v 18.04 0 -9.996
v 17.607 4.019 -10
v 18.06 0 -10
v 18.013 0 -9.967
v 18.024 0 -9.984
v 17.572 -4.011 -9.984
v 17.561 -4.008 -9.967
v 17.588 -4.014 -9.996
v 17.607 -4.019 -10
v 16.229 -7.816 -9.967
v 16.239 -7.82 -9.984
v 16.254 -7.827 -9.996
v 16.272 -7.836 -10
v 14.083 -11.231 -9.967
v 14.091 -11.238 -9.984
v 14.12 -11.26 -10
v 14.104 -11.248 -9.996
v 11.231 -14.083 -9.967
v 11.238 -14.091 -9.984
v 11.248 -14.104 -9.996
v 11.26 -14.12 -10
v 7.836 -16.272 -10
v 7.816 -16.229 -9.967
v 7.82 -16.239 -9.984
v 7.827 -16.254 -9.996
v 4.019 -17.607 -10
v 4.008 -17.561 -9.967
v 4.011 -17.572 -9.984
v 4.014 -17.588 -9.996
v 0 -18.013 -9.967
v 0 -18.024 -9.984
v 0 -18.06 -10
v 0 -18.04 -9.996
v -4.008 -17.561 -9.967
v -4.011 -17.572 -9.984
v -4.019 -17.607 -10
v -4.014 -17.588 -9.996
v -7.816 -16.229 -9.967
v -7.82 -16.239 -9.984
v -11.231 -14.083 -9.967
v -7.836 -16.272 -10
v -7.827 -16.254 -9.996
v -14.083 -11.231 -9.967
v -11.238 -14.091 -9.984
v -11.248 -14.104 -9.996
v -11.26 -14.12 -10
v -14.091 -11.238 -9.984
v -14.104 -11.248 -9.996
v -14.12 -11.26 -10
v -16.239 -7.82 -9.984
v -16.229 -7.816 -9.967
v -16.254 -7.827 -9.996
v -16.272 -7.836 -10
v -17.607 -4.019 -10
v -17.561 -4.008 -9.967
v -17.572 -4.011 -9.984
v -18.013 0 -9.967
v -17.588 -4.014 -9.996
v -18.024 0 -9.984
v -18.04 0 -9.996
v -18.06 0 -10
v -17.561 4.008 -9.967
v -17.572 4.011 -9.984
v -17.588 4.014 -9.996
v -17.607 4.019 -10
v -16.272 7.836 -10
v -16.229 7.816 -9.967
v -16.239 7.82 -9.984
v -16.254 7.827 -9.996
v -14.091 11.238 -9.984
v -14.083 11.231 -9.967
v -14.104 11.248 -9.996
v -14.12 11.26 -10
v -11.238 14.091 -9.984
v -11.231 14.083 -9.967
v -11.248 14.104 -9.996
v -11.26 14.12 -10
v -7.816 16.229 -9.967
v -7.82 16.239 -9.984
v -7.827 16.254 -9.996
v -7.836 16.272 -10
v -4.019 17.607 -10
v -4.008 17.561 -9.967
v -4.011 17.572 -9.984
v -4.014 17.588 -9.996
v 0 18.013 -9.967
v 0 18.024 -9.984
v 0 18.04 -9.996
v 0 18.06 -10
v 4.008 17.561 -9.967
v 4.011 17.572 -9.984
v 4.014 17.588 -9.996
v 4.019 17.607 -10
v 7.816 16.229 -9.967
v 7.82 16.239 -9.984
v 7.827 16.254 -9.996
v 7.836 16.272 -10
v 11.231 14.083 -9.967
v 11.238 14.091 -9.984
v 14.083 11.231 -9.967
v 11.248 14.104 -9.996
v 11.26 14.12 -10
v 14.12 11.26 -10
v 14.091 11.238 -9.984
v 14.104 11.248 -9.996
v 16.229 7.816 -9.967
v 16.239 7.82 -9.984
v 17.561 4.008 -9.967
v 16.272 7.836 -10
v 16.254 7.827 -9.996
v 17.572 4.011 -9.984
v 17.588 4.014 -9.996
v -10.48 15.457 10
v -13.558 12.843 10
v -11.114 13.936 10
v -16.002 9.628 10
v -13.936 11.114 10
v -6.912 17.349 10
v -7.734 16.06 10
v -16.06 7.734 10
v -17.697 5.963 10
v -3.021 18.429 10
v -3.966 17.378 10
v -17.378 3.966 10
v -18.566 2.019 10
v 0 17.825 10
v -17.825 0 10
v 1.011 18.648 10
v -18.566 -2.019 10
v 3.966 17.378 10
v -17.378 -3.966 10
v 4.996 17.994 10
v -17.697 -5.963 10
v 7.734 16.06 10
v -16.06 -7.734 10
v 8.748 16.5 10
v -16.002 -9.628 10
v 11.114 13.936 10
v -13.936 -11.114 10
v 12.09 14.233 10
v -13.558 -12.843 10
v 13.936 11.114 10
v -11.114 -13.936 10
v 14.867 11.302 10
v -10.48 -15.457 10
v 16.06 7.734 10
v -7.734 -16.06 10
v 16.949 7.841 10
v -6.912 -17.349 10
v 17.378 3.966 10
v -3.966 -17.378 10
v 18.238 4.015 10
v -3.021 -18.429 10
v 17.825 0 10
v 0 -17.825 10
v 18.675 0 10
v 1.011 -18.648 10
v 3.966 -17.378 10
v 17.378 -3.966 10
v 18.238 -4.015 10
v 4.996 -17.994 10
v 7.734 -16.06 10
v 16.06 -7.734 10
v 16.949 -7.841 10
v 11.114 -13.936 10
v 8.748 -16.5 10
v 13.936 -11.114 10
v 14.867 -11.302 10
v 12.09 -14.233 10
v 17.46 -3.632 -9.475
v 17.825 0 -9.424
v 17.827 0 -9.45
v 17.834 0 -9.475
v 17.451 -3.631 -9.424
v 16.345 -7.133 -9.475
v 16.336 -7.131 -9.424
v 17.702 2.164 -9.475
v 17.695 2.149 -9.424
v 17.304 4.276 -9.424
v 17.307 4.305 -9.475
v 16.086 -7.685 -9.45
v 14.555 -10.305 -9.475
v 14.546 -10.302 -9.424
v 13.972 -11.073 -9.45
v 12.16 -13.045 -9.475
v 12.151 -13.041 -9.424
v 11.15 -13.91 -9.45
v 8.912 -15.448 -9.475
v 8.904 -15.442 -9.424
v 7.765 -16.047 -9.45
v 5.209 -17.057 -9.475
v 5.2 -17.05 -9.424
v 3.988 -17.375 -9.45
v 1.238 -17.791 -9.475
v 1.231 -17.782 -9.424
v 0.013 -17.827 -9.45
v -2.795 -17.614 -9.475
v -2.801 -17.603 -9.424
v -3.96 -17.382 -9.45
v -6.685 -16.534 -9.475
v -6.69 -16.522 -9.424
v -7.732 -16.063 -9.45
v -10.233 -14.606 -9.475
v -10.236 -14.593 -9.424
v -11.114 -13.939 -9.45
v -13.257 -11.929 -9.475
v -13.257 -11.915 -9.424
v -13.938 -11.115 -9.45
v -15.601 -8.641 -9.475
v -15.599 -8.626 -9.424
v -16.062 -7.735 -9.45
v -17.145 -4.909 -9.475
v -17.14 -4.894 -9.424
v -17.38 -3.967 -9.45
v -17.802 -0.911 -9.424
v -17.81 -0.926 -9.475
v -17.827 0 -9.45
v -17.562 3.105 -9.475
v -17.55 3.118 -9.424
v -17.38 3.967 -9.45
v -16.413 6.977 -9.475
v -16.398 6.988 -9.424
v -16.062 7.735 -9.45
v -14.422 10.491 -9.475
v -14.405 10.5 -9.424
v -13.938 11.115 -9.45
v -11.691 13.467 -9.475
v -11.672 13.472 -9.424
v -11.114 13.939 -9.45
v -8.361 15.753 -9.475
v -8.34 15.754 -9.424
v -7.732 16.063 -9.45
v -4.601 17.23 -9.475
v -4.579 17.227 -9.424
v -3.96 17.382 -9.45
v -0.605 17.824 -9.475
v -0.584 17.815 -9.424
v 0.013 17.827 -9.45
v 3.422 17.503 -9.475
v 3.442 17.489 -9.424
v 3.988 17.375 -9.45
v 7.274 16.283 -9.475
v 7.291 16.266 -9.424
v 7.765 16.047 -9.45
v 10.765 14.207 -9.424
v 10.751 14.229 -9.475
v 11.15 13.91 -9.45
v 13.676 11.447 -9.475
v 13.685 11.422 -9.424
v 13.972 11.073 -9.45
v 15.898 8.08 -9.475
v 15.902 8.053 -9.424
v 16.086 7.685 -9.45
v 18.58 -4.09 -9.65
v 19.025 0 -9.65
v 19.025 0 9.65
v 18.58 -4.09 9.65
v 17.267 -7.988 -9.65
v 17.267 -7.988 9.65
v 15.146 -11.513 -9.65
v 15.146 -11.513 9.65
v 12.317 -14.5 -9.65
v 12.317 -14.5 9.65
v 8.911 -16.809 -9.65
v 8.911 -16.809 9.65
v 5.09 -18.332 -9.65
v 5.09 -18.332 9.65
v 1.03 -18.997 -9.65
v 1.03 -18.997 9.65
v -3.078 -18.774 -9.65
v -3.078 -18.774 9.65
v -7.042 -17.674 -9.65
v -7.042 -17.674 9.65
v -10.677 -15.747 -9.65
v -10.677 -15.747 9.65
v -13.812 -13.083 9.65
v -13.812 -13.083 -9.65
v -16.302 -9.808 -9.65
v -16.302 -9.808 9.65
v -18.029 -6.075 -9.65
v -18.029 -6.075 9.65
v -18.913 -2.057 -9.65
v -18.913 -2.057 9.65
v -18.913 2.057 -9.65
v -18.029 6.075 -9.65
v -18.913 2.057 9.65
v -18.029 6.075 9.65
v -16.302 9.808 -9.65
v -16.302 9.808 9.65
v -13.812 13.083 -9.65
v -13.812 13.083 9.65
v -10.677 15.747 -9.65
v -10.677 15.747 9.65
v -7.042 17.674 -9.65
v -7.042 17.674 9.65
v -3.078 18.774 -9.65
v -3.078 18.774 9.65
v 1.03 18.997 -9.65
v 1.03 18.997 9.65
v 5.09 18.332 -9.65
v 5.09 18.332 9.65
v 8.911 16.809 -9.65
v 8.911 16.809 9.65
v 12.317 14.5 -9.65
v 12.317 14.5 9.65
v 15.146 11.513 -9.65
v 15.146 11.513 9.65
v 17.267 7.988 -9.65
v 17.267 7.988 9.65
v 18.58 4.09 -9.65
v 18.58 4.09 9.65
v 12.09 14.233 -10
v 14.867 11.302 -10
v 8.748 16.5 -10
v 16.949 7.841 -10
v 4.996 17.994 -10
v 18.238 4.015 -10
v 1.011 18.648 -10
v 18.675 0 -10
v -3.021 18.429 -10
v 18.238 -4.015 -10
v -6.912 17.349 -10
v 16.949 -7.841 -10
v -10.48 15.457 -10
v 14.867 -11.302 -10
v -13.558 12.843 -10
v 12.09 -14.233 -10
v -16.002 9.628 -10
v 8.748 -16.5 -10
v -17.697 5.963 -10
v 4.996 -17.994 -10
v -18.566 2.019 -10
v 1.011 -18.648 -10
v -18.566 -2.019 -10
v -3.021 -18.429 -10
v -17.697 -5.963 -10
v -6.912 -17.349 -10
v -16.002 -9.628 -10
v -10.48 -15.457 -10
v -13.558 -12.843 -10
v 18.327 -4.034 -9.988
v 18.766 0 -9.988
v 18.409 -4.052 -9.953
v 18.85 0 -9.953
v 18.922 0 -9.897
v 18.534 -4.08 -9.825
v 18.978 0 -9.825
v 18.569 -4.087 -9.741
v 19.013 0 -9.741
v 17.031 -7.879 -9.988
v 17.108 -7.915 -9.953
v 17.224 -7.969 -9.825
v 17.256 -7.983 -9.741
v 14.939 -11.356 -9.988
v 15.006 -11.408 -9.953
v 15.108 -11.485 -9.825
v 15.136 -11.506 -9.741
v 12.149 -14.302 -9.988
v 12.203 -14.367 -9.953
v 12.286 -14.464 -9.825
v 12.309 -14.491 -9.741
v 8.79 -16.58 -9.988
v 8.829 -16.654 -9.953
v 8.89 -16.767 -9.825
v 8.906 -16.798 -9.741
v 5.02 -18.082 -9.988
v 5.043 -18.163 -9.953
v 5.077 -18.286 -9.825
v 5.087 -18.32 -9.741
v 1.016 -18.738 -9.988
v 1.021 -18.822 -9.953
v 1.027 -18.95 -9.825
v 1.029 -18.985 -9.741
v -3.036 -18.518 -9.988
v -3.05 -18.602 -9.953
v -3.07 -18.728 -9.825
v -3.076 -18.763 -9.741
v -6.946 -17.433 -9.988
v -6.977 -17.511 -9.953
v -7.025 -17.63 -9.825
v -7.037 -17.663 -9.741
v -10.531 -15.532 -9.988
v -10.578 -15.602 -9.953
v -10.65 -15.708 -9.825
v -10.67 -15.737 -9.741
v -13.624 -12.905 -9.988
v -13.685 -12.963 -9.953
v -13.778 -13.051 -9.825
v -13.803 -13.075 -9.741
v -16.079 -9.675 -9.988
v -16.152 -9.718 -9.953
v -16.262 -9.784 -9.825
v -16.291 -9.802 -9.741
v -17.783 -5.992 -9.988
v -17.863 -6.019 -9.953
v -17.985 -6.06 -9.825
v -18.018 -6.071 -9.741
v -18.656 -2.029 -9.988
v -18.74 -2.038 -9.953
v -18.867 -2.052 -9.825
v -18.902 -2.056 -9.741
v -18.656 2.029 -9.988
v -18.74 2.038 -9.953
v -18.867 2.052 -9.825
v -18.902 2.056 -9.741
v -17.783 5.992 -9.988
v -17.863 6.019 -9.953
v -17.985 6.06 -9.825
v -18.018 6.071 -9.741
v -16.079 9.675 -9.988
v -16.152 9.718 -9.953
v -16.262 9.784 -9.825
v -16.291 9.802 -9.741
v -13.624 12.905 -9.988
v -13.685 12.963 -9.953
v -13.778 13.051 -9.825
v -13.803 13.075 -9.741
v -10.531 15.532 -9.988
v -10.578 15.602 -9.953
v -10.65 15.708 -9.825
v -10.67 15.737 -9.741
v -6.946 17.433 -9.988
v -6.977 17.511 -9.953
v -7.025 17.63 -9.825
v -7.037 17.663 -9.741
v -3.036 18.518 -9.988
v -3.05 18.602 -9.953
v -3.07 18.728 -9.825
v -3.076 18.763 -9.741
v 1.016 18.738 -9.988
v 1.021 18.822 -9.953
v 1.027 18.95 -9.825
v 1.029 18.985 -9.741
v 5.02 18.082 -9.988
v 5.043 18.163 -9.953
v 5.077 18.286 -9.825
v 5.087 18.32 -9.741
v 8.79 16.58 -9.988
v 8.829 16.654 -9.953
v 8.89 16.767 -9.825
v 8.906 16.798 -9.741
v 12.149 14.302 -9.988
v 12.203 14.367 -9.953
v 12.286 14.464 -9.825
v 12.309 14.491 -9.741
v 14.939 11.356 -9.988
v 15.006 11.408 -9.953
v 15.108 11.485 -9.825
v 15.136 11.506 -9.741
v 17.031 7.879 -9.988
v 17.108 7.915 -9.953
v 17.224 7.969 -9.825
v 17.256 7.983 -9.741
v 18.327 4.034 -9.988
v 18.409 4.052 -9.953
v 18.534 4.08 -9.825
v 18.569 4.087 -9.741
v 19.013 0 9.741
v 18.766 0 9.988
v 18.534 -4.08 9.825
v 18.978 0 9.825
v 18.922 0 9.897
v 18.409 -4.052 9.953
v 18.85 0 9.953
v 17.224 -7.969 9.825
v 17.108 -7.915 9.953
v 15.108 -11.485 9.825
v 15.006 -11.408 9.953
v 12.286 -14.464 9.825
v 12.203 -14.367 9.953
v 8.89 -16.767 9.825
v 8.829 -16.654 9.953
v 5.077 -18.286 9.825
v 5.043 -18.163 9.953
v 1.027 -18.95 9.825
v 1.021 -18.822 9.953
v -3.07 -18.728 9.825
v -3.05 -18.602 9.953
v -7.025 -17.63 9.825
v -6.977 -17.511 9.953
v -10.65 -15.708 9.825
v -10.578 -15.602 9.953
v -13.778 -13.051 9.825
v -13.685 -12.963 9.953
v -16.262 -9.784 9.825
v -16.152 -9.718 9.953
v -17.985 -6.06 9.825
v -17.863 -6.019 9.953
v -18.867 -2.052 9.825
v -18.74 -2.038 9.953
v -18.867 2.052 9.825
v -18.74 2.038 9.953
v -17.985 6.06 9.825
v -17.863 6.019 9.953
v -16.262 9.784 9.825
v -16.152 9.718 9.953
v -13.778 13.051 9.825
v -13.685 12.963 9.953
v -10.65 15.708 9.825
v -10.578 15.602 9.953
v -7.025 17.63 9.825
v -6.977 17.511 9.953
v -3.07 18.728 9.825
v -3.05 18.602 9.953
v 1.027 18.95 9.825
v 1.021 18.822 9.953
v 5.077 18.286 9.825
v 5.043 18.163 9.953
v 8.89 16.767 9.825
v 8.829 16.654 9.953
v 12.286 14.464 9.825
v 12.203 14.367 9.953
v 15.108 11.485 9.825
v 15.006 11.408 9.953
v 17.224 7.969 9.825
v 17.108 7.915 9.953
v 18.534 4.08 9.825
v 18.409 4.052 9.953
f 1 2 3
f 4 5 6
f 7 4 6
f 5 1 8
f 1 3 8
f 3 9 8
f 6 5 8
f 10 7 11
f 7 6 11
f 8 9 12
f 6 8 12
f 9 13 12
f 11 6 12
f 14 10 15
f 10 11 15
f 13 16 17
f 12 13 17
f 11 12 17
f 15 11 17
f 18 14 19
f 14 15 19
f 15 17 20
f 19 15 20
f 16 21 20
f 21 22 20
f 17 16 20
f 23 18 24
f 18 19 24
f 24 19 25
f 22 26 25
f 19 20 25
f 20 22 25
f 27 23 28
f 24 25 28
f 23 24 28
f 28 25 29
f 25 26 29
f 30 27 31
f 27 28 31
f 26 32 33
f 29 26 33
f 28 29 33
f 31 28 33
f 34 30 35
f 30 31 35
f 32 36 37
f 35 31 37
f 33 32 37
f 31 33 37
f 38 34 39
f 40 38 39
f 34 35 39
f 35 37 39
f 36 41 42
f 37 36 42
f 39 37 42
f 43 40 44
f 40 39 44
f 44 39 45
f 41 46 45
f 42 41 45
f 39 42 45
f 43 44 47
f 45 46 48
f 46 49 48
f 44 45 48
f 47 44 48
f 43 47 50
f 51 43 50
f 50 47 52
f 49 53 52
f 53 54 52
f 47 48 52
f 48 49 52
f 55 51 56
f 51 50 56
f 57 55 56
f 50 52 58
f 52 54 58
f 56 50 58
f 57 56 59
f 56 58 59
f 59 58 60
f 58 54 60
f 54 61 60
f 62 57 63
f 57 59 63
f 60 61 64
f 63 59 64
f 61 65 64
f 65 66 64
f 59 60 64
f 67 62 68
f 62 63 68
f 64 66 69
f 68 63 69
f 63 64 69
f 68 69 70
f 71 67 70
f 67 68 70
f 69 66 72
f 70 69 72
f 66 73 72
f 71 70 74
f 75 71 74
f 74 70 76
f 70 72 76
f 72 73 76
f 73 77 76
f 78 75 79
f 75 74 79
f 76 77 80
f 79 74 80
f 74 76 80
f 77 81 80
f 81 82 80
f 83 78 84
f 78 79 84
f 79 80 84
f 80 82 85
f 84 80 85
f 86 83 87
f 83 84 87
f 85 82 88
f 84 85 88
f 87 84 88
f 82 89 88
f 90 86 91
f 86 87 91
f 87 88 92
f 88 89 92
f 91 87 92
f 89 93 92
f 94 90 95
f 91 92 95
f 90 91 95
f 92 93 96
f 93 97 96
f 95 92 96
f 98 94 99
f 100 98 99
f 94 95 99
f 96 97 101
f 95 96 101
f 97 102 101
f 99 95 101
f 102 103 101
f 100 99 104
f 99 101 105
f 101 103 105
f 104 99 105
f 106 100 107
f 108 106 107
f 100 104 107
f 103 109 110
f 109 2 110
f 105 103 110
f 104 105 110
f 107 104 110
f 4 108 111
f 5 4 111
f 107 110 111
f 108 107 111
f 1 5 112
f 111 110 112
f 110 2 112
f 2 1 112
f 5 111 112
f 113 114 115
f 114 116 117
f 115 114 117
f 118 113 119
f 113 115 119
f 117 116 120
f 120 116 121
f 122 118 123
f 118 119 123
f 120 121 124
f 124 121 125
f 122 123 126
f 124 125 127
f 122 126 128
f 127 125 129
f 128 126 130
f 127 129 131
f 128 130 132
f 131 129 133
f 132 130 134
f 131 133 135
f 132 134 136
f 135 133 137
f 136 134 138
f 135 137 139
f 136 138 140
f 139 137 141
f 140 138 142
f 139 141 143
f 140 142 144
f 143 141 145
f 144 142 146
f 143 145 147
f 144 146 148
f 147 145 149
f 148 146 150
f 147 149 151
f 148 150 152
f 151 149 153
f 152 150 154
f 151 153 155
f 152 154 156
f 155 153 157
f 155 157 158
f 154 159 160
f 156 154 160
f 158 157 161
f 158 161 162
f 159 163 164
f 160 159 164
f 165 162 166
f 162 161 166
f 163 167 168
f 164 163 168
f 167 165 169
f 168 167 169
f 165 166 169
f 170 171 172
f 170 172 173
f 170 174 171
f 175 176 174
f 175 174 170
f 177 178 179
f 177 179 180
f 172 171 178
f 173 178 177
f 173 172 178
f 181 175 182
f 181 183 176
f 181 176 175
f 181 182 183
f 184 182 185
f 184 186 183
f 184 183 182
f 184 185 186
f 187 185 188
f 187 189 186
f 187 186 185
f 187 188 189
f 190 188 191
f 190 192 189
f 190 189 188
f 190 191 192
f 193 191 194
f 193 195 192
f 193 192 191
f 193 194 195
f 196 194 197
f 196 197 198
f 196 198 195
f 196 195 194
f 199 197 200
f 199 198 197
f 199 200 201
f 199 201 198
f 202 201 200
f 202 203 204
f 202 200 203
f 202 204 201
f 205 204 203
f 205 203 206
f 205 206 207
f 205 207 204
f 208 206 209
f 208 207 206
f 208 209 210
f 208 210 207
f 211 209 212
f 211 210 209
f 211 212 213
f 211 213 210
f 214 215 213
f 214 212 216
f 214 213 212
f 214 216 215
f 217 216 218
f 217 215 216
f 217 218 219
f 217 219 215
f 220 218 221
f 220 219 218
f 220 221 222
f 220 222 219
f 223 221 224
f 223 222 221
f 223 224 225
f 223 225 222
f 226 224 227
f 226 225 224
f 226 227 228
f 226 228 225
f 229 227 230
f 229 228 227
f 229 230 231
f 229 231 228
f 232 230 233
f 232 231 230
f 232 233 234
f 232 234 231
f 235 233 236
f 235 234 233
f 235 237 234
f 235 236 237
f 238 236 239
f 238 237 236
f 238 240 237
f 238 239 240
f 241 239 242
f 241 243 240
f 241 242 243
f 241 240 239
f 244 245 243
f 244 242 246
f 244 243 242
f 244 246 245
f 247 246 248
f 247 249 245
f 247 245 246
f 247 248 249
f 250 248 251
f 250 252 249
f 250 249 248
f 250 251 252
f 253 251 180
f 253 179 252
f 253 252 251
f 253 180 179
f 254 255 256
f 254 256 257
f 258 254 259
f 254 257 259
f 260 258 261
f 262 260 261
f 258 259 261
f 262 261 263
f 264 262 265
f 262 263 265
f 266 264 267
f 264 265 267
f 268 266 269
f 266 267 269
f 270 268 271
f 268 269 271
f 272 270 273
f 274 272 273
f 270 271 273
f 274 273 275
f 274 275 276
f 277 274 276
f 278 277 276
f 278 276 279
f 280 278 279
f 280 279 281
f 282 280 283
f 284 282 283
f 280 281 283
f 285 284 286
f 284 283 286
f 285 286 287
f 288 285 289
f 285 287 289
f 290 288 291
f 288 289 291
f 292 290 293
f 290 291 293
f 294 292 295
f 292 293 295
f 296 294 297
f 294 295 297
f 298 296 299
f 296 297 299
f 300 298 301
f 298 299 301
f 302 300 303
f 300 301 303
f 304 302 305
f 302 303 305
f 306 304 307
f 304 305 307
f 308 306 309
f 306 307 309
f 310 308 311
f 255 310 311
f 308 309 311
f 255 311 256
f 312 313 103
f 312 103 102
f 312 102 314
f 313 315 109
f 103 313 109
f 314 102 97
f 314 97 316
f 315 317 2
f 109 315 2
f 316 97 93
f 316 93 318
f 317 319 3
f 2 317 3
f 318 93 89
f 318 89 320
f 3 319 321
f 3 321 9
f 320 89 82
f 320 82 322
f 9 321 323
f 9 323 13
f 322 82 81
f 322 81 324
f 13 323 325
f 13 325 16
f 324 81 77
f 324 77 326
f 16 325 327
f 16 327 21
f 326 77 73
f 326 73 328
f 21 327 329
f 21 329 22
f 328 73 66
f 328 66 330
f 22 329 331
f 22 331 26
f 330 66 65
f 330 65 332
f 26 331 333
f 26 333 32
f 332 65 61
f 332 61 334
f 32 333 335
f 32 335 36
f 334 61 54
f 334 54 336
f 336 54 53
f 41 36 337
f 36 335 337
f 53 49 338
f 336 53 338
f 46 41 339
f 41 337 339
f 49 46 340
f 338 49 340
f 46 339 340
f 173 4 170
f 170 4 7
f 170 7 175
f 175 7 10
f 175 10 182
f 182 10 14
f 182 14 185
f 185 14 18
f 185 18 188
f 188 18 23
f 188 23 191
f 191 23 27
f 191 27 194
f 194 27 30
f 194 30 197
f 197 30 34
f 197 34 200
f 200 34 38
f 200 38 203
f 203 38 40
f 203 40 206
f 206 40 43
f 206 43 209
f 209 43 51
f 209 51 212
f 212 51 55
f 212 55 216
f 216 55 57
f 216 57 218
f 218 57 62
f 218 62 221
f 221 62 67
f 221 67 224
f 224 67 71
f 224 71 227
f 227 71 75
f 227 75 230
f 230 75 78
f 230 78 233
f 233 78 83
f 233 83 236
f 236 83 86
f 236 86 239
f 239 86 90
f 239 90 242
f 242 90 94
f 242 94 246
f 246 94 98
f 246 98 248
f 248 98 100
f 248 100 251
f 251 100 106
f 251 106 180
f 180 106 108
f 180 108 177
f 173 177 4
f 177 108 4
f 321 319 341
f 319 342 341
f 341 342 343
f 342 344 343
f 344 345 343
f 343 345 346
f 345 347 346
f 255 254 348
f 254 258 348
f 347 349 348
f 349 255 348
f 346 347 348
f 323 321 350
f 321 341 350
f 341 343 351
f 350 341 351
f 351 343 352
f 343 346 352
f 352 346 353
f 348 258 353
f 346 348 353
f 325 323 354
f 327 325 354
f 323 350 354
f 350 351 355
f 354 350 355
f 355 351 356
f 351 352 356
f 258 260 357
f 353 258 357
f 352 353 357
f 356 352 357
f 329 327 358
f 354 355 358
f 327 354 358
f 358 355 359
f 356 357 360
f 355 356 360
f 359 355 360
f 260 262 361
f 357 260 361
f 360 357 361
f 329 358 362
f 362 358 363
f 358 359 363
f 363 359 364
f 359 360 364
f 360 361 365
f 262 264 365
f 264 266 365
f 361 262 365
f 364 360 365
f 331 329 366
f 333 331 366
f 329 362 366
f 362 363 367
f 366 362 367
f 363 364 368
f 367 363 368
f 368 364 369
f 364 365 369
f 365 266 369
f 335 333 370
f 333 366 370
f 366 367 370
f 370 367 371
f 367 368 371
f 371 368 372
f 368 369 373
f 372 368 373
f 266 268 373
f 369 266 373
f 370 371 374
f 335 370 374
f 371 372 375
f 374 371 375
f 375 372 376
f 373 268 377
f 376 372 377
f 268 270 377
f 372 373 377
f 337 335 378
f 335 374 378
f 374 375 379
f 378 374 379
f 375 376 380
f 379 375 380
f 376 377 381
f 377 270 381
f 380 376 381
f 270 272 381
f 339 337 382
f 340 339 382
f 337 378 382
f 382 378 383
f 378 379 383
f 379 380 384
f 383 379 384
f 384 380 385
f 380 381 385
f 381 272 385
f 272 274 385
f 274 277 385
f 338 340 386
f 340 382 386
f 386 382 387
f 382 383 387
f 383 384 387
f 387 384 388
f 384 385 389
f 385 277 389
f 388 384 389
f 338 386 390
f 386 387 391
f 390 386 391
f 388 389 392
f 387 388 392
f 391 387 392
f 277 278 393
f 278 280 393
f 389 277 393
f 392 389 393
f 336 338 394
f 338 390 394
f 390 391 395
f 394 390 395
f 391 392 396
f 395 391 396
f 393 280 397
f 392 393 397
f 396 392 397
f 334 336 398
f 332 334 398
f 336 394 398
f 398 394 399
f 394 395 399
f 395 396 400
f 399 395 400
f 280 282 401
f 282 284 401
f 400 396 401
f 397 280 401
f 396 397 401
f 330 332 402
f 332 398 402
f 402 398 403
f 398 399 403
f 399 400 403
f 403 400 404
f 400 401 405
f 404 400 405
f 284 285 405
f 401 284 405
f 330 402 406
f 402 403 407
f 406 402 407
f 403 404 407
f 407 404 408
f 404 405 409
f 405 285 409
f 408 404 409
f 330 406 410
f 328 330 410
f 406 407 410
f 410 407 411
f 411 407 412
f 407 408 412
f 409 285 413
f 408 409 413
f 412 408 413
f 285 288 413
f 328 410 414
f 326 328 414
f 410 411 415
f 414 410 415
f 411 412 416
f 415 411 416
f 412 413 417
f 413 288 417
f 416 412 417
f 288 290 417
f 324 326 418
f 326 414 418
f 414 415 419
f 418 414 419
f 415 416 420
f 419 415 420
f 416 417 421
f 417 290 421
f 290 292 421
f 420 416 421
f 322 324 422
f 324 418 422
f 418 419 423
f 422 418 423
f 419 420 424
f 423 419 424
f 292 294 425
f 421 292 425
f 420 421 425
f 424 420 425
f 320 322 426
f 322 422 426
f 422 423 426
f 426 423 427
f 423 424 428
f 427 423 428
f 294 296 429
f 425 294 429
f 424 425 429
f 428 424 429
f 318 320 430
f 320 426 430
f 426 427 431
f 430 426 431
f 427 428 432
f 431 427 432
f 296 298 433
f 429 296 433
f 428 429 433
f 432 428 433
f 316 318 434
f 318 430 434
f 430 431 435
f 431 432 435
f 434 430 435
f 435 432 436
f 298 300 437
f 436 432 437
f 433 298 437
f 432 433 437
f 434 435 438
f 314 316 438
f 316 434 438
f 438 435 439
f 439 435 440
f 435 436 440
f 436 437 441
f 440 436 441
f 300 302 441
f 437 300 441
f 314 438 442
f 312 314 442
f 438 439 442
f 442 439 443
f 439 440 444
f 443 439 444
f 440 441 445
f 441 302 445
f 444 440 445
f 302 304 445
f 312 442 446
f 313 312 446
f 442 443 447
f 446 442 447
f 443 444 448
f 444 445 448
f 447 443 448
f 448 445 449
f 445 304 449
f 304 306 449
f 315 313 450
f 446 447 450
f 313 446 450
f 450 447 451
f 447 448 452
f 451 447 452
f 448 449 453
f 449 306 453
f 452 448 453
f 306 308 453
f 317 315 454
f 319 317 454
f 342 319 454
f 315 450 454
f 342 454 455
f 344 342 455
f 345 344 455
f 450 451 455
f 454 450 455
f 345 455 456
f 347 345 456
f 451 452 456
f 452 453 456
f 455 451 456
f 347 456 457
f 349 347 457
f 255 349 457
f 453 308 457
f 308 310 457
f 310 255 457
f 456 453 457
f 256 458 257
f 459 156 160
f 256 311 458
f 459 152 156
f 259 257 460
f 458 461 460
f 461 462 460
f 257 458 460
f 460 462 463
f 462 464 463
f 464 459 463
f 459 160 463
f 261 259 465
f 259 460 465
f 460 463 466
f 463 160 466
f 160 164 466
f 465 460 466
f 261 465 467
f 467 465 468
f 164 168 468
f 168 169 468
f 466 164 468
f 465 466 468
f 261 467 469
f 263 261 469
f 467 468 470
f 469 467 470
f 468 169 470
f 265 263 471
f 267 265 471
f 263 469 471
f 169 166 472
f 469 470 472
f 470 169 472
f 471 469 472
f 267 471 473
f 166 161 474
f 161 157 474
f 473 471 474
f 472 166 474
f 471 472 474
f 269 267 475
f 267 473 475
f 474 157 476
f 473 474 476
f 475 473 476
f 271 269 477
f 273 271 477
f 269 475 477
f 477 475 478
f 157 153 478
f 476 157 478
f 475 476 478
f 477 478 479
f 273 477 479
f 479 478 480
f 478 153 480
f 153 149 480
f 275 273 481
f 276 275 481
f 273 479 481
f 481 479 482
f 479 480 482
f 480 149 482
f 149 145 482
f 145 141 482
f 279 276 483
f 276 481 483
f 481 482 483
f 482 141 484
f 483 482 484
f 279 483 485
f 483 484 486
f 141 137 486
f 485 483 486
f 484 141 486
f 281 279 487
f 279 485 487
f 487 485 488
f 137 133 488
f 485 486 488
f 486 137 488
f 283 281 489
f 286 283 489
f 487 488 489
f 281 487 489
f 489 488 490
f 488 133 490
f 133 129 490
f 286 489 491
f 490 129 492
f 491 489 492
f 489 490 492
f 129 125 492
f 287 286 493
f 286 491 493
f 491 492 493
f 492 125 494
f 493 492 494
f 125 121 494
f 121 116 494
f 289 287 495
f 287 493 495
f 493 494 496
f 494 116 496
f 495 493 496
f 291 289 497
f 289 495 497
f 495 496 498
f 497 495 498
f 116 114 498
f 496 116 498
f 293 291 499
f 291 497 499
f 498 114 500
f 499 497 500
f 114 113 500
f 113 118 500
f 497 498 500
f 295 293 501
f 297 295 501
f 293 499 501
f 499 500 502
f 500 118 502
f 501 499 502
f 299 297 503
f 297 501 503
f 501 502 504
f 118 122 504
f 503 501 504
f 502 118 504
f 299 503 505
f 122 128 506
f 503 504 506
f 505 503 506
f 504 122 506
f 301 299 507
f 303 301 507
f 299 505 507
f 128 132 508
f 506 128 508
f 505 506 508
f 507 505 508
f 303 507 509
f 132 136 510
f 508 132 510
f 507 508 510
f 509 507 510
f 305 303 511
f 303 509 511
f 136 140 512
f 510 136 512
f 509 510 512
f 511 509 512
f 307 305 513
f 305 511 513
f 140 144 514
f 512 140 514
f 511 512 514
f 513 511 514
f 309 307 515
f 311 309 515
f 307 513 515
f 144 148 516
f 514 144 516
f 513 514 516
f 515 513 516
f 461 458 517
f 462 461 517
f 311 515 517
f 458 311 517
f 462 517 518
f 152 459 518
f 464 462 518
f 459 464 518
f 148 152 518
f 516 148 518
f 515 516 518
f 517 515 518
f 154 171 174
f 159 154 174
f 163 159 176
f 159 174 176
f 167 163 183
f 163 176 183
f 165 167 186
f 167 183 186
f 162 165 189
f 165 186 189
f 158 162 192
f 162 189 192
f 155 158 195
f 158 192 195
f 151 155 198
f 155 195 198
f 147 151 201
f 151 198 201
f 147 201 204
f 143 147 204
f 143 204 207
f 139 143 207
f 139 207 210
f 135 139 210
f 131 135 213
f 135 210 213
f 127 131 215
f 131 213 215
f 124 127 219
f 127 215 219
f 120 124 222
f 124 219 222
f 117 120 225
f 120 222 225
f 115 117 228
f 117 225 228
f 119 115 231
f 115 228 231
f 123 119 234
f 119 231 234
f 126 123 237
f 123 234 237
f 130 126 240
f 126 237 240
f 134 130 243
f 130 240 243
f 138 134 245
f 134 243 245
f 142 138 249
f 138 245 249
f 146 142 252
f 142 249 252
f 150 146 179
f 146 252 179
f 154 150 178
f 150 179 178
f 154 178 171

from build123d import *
from OCP.BRepFilletAPI import BRepFilletAPI_MakeFillet

# Parameters (mm, degrees)
FILLET1_R1 = 0.05
FILLET1_R2 = 0.15


with BuildPart() as part:
    # Sketch1 → Revolve1 (revolve)
    with BuildSketch(Plane(origin=(0, 0, 0), x_dir=(0, 0, -1), z_dir=(1, 0, 0))):
        with BuildLine():
            Line((-10, 18.675), (-10, 17.825))
            Line((-10, 17.825), (9.450504516, 17.825))
            Line((9.450504516, 17.825), (10, 18.025))
            Line((10, 18.025), (10, 18.675))
            ThreePointArc((10, 18.675), (9.897487373, 18.922487373), (9.65, 19.025))
            Line((9.65, 19.025), (-9.65, 19.025))
            ThreePointArc((-9.65, 19.025), (-9.897487373, 18.922487373), (-10, 18.675))
        make_face()
    revolve(axis=Axis((0, 0, 11.704423327), (0, 0, -1)))

    # Fillet1: one fillet with a radius per group of edges: ONE call of the kernel's fillet builder (fillet() takes one radius for all edges)
    fillet1_edges_1 = [part.edges().sort_by_distance(p)[0] for p in [
        (0, -18.025, -10),
    ]]
    fillet1_edges_2 = [part.edges().sort_by_distance(p)[0] for p in [
        (0, -17.825, -9.450504516),
    ]]
    fillet1 = BRepFilletAPI_MakeFillet(part.part.solid().wrapped)
    for e in fillet1_edges_1:
        fillet1.Add(FILLET1_R1, e.wrapped)
    for e in fillet1_edges_2:
        fillet1.Add(FILLET1_R2, e.wrapped)
    add(Compound.cast(fillet1.Shape()), mode=Mode.REPLACE)


solid = part.part
